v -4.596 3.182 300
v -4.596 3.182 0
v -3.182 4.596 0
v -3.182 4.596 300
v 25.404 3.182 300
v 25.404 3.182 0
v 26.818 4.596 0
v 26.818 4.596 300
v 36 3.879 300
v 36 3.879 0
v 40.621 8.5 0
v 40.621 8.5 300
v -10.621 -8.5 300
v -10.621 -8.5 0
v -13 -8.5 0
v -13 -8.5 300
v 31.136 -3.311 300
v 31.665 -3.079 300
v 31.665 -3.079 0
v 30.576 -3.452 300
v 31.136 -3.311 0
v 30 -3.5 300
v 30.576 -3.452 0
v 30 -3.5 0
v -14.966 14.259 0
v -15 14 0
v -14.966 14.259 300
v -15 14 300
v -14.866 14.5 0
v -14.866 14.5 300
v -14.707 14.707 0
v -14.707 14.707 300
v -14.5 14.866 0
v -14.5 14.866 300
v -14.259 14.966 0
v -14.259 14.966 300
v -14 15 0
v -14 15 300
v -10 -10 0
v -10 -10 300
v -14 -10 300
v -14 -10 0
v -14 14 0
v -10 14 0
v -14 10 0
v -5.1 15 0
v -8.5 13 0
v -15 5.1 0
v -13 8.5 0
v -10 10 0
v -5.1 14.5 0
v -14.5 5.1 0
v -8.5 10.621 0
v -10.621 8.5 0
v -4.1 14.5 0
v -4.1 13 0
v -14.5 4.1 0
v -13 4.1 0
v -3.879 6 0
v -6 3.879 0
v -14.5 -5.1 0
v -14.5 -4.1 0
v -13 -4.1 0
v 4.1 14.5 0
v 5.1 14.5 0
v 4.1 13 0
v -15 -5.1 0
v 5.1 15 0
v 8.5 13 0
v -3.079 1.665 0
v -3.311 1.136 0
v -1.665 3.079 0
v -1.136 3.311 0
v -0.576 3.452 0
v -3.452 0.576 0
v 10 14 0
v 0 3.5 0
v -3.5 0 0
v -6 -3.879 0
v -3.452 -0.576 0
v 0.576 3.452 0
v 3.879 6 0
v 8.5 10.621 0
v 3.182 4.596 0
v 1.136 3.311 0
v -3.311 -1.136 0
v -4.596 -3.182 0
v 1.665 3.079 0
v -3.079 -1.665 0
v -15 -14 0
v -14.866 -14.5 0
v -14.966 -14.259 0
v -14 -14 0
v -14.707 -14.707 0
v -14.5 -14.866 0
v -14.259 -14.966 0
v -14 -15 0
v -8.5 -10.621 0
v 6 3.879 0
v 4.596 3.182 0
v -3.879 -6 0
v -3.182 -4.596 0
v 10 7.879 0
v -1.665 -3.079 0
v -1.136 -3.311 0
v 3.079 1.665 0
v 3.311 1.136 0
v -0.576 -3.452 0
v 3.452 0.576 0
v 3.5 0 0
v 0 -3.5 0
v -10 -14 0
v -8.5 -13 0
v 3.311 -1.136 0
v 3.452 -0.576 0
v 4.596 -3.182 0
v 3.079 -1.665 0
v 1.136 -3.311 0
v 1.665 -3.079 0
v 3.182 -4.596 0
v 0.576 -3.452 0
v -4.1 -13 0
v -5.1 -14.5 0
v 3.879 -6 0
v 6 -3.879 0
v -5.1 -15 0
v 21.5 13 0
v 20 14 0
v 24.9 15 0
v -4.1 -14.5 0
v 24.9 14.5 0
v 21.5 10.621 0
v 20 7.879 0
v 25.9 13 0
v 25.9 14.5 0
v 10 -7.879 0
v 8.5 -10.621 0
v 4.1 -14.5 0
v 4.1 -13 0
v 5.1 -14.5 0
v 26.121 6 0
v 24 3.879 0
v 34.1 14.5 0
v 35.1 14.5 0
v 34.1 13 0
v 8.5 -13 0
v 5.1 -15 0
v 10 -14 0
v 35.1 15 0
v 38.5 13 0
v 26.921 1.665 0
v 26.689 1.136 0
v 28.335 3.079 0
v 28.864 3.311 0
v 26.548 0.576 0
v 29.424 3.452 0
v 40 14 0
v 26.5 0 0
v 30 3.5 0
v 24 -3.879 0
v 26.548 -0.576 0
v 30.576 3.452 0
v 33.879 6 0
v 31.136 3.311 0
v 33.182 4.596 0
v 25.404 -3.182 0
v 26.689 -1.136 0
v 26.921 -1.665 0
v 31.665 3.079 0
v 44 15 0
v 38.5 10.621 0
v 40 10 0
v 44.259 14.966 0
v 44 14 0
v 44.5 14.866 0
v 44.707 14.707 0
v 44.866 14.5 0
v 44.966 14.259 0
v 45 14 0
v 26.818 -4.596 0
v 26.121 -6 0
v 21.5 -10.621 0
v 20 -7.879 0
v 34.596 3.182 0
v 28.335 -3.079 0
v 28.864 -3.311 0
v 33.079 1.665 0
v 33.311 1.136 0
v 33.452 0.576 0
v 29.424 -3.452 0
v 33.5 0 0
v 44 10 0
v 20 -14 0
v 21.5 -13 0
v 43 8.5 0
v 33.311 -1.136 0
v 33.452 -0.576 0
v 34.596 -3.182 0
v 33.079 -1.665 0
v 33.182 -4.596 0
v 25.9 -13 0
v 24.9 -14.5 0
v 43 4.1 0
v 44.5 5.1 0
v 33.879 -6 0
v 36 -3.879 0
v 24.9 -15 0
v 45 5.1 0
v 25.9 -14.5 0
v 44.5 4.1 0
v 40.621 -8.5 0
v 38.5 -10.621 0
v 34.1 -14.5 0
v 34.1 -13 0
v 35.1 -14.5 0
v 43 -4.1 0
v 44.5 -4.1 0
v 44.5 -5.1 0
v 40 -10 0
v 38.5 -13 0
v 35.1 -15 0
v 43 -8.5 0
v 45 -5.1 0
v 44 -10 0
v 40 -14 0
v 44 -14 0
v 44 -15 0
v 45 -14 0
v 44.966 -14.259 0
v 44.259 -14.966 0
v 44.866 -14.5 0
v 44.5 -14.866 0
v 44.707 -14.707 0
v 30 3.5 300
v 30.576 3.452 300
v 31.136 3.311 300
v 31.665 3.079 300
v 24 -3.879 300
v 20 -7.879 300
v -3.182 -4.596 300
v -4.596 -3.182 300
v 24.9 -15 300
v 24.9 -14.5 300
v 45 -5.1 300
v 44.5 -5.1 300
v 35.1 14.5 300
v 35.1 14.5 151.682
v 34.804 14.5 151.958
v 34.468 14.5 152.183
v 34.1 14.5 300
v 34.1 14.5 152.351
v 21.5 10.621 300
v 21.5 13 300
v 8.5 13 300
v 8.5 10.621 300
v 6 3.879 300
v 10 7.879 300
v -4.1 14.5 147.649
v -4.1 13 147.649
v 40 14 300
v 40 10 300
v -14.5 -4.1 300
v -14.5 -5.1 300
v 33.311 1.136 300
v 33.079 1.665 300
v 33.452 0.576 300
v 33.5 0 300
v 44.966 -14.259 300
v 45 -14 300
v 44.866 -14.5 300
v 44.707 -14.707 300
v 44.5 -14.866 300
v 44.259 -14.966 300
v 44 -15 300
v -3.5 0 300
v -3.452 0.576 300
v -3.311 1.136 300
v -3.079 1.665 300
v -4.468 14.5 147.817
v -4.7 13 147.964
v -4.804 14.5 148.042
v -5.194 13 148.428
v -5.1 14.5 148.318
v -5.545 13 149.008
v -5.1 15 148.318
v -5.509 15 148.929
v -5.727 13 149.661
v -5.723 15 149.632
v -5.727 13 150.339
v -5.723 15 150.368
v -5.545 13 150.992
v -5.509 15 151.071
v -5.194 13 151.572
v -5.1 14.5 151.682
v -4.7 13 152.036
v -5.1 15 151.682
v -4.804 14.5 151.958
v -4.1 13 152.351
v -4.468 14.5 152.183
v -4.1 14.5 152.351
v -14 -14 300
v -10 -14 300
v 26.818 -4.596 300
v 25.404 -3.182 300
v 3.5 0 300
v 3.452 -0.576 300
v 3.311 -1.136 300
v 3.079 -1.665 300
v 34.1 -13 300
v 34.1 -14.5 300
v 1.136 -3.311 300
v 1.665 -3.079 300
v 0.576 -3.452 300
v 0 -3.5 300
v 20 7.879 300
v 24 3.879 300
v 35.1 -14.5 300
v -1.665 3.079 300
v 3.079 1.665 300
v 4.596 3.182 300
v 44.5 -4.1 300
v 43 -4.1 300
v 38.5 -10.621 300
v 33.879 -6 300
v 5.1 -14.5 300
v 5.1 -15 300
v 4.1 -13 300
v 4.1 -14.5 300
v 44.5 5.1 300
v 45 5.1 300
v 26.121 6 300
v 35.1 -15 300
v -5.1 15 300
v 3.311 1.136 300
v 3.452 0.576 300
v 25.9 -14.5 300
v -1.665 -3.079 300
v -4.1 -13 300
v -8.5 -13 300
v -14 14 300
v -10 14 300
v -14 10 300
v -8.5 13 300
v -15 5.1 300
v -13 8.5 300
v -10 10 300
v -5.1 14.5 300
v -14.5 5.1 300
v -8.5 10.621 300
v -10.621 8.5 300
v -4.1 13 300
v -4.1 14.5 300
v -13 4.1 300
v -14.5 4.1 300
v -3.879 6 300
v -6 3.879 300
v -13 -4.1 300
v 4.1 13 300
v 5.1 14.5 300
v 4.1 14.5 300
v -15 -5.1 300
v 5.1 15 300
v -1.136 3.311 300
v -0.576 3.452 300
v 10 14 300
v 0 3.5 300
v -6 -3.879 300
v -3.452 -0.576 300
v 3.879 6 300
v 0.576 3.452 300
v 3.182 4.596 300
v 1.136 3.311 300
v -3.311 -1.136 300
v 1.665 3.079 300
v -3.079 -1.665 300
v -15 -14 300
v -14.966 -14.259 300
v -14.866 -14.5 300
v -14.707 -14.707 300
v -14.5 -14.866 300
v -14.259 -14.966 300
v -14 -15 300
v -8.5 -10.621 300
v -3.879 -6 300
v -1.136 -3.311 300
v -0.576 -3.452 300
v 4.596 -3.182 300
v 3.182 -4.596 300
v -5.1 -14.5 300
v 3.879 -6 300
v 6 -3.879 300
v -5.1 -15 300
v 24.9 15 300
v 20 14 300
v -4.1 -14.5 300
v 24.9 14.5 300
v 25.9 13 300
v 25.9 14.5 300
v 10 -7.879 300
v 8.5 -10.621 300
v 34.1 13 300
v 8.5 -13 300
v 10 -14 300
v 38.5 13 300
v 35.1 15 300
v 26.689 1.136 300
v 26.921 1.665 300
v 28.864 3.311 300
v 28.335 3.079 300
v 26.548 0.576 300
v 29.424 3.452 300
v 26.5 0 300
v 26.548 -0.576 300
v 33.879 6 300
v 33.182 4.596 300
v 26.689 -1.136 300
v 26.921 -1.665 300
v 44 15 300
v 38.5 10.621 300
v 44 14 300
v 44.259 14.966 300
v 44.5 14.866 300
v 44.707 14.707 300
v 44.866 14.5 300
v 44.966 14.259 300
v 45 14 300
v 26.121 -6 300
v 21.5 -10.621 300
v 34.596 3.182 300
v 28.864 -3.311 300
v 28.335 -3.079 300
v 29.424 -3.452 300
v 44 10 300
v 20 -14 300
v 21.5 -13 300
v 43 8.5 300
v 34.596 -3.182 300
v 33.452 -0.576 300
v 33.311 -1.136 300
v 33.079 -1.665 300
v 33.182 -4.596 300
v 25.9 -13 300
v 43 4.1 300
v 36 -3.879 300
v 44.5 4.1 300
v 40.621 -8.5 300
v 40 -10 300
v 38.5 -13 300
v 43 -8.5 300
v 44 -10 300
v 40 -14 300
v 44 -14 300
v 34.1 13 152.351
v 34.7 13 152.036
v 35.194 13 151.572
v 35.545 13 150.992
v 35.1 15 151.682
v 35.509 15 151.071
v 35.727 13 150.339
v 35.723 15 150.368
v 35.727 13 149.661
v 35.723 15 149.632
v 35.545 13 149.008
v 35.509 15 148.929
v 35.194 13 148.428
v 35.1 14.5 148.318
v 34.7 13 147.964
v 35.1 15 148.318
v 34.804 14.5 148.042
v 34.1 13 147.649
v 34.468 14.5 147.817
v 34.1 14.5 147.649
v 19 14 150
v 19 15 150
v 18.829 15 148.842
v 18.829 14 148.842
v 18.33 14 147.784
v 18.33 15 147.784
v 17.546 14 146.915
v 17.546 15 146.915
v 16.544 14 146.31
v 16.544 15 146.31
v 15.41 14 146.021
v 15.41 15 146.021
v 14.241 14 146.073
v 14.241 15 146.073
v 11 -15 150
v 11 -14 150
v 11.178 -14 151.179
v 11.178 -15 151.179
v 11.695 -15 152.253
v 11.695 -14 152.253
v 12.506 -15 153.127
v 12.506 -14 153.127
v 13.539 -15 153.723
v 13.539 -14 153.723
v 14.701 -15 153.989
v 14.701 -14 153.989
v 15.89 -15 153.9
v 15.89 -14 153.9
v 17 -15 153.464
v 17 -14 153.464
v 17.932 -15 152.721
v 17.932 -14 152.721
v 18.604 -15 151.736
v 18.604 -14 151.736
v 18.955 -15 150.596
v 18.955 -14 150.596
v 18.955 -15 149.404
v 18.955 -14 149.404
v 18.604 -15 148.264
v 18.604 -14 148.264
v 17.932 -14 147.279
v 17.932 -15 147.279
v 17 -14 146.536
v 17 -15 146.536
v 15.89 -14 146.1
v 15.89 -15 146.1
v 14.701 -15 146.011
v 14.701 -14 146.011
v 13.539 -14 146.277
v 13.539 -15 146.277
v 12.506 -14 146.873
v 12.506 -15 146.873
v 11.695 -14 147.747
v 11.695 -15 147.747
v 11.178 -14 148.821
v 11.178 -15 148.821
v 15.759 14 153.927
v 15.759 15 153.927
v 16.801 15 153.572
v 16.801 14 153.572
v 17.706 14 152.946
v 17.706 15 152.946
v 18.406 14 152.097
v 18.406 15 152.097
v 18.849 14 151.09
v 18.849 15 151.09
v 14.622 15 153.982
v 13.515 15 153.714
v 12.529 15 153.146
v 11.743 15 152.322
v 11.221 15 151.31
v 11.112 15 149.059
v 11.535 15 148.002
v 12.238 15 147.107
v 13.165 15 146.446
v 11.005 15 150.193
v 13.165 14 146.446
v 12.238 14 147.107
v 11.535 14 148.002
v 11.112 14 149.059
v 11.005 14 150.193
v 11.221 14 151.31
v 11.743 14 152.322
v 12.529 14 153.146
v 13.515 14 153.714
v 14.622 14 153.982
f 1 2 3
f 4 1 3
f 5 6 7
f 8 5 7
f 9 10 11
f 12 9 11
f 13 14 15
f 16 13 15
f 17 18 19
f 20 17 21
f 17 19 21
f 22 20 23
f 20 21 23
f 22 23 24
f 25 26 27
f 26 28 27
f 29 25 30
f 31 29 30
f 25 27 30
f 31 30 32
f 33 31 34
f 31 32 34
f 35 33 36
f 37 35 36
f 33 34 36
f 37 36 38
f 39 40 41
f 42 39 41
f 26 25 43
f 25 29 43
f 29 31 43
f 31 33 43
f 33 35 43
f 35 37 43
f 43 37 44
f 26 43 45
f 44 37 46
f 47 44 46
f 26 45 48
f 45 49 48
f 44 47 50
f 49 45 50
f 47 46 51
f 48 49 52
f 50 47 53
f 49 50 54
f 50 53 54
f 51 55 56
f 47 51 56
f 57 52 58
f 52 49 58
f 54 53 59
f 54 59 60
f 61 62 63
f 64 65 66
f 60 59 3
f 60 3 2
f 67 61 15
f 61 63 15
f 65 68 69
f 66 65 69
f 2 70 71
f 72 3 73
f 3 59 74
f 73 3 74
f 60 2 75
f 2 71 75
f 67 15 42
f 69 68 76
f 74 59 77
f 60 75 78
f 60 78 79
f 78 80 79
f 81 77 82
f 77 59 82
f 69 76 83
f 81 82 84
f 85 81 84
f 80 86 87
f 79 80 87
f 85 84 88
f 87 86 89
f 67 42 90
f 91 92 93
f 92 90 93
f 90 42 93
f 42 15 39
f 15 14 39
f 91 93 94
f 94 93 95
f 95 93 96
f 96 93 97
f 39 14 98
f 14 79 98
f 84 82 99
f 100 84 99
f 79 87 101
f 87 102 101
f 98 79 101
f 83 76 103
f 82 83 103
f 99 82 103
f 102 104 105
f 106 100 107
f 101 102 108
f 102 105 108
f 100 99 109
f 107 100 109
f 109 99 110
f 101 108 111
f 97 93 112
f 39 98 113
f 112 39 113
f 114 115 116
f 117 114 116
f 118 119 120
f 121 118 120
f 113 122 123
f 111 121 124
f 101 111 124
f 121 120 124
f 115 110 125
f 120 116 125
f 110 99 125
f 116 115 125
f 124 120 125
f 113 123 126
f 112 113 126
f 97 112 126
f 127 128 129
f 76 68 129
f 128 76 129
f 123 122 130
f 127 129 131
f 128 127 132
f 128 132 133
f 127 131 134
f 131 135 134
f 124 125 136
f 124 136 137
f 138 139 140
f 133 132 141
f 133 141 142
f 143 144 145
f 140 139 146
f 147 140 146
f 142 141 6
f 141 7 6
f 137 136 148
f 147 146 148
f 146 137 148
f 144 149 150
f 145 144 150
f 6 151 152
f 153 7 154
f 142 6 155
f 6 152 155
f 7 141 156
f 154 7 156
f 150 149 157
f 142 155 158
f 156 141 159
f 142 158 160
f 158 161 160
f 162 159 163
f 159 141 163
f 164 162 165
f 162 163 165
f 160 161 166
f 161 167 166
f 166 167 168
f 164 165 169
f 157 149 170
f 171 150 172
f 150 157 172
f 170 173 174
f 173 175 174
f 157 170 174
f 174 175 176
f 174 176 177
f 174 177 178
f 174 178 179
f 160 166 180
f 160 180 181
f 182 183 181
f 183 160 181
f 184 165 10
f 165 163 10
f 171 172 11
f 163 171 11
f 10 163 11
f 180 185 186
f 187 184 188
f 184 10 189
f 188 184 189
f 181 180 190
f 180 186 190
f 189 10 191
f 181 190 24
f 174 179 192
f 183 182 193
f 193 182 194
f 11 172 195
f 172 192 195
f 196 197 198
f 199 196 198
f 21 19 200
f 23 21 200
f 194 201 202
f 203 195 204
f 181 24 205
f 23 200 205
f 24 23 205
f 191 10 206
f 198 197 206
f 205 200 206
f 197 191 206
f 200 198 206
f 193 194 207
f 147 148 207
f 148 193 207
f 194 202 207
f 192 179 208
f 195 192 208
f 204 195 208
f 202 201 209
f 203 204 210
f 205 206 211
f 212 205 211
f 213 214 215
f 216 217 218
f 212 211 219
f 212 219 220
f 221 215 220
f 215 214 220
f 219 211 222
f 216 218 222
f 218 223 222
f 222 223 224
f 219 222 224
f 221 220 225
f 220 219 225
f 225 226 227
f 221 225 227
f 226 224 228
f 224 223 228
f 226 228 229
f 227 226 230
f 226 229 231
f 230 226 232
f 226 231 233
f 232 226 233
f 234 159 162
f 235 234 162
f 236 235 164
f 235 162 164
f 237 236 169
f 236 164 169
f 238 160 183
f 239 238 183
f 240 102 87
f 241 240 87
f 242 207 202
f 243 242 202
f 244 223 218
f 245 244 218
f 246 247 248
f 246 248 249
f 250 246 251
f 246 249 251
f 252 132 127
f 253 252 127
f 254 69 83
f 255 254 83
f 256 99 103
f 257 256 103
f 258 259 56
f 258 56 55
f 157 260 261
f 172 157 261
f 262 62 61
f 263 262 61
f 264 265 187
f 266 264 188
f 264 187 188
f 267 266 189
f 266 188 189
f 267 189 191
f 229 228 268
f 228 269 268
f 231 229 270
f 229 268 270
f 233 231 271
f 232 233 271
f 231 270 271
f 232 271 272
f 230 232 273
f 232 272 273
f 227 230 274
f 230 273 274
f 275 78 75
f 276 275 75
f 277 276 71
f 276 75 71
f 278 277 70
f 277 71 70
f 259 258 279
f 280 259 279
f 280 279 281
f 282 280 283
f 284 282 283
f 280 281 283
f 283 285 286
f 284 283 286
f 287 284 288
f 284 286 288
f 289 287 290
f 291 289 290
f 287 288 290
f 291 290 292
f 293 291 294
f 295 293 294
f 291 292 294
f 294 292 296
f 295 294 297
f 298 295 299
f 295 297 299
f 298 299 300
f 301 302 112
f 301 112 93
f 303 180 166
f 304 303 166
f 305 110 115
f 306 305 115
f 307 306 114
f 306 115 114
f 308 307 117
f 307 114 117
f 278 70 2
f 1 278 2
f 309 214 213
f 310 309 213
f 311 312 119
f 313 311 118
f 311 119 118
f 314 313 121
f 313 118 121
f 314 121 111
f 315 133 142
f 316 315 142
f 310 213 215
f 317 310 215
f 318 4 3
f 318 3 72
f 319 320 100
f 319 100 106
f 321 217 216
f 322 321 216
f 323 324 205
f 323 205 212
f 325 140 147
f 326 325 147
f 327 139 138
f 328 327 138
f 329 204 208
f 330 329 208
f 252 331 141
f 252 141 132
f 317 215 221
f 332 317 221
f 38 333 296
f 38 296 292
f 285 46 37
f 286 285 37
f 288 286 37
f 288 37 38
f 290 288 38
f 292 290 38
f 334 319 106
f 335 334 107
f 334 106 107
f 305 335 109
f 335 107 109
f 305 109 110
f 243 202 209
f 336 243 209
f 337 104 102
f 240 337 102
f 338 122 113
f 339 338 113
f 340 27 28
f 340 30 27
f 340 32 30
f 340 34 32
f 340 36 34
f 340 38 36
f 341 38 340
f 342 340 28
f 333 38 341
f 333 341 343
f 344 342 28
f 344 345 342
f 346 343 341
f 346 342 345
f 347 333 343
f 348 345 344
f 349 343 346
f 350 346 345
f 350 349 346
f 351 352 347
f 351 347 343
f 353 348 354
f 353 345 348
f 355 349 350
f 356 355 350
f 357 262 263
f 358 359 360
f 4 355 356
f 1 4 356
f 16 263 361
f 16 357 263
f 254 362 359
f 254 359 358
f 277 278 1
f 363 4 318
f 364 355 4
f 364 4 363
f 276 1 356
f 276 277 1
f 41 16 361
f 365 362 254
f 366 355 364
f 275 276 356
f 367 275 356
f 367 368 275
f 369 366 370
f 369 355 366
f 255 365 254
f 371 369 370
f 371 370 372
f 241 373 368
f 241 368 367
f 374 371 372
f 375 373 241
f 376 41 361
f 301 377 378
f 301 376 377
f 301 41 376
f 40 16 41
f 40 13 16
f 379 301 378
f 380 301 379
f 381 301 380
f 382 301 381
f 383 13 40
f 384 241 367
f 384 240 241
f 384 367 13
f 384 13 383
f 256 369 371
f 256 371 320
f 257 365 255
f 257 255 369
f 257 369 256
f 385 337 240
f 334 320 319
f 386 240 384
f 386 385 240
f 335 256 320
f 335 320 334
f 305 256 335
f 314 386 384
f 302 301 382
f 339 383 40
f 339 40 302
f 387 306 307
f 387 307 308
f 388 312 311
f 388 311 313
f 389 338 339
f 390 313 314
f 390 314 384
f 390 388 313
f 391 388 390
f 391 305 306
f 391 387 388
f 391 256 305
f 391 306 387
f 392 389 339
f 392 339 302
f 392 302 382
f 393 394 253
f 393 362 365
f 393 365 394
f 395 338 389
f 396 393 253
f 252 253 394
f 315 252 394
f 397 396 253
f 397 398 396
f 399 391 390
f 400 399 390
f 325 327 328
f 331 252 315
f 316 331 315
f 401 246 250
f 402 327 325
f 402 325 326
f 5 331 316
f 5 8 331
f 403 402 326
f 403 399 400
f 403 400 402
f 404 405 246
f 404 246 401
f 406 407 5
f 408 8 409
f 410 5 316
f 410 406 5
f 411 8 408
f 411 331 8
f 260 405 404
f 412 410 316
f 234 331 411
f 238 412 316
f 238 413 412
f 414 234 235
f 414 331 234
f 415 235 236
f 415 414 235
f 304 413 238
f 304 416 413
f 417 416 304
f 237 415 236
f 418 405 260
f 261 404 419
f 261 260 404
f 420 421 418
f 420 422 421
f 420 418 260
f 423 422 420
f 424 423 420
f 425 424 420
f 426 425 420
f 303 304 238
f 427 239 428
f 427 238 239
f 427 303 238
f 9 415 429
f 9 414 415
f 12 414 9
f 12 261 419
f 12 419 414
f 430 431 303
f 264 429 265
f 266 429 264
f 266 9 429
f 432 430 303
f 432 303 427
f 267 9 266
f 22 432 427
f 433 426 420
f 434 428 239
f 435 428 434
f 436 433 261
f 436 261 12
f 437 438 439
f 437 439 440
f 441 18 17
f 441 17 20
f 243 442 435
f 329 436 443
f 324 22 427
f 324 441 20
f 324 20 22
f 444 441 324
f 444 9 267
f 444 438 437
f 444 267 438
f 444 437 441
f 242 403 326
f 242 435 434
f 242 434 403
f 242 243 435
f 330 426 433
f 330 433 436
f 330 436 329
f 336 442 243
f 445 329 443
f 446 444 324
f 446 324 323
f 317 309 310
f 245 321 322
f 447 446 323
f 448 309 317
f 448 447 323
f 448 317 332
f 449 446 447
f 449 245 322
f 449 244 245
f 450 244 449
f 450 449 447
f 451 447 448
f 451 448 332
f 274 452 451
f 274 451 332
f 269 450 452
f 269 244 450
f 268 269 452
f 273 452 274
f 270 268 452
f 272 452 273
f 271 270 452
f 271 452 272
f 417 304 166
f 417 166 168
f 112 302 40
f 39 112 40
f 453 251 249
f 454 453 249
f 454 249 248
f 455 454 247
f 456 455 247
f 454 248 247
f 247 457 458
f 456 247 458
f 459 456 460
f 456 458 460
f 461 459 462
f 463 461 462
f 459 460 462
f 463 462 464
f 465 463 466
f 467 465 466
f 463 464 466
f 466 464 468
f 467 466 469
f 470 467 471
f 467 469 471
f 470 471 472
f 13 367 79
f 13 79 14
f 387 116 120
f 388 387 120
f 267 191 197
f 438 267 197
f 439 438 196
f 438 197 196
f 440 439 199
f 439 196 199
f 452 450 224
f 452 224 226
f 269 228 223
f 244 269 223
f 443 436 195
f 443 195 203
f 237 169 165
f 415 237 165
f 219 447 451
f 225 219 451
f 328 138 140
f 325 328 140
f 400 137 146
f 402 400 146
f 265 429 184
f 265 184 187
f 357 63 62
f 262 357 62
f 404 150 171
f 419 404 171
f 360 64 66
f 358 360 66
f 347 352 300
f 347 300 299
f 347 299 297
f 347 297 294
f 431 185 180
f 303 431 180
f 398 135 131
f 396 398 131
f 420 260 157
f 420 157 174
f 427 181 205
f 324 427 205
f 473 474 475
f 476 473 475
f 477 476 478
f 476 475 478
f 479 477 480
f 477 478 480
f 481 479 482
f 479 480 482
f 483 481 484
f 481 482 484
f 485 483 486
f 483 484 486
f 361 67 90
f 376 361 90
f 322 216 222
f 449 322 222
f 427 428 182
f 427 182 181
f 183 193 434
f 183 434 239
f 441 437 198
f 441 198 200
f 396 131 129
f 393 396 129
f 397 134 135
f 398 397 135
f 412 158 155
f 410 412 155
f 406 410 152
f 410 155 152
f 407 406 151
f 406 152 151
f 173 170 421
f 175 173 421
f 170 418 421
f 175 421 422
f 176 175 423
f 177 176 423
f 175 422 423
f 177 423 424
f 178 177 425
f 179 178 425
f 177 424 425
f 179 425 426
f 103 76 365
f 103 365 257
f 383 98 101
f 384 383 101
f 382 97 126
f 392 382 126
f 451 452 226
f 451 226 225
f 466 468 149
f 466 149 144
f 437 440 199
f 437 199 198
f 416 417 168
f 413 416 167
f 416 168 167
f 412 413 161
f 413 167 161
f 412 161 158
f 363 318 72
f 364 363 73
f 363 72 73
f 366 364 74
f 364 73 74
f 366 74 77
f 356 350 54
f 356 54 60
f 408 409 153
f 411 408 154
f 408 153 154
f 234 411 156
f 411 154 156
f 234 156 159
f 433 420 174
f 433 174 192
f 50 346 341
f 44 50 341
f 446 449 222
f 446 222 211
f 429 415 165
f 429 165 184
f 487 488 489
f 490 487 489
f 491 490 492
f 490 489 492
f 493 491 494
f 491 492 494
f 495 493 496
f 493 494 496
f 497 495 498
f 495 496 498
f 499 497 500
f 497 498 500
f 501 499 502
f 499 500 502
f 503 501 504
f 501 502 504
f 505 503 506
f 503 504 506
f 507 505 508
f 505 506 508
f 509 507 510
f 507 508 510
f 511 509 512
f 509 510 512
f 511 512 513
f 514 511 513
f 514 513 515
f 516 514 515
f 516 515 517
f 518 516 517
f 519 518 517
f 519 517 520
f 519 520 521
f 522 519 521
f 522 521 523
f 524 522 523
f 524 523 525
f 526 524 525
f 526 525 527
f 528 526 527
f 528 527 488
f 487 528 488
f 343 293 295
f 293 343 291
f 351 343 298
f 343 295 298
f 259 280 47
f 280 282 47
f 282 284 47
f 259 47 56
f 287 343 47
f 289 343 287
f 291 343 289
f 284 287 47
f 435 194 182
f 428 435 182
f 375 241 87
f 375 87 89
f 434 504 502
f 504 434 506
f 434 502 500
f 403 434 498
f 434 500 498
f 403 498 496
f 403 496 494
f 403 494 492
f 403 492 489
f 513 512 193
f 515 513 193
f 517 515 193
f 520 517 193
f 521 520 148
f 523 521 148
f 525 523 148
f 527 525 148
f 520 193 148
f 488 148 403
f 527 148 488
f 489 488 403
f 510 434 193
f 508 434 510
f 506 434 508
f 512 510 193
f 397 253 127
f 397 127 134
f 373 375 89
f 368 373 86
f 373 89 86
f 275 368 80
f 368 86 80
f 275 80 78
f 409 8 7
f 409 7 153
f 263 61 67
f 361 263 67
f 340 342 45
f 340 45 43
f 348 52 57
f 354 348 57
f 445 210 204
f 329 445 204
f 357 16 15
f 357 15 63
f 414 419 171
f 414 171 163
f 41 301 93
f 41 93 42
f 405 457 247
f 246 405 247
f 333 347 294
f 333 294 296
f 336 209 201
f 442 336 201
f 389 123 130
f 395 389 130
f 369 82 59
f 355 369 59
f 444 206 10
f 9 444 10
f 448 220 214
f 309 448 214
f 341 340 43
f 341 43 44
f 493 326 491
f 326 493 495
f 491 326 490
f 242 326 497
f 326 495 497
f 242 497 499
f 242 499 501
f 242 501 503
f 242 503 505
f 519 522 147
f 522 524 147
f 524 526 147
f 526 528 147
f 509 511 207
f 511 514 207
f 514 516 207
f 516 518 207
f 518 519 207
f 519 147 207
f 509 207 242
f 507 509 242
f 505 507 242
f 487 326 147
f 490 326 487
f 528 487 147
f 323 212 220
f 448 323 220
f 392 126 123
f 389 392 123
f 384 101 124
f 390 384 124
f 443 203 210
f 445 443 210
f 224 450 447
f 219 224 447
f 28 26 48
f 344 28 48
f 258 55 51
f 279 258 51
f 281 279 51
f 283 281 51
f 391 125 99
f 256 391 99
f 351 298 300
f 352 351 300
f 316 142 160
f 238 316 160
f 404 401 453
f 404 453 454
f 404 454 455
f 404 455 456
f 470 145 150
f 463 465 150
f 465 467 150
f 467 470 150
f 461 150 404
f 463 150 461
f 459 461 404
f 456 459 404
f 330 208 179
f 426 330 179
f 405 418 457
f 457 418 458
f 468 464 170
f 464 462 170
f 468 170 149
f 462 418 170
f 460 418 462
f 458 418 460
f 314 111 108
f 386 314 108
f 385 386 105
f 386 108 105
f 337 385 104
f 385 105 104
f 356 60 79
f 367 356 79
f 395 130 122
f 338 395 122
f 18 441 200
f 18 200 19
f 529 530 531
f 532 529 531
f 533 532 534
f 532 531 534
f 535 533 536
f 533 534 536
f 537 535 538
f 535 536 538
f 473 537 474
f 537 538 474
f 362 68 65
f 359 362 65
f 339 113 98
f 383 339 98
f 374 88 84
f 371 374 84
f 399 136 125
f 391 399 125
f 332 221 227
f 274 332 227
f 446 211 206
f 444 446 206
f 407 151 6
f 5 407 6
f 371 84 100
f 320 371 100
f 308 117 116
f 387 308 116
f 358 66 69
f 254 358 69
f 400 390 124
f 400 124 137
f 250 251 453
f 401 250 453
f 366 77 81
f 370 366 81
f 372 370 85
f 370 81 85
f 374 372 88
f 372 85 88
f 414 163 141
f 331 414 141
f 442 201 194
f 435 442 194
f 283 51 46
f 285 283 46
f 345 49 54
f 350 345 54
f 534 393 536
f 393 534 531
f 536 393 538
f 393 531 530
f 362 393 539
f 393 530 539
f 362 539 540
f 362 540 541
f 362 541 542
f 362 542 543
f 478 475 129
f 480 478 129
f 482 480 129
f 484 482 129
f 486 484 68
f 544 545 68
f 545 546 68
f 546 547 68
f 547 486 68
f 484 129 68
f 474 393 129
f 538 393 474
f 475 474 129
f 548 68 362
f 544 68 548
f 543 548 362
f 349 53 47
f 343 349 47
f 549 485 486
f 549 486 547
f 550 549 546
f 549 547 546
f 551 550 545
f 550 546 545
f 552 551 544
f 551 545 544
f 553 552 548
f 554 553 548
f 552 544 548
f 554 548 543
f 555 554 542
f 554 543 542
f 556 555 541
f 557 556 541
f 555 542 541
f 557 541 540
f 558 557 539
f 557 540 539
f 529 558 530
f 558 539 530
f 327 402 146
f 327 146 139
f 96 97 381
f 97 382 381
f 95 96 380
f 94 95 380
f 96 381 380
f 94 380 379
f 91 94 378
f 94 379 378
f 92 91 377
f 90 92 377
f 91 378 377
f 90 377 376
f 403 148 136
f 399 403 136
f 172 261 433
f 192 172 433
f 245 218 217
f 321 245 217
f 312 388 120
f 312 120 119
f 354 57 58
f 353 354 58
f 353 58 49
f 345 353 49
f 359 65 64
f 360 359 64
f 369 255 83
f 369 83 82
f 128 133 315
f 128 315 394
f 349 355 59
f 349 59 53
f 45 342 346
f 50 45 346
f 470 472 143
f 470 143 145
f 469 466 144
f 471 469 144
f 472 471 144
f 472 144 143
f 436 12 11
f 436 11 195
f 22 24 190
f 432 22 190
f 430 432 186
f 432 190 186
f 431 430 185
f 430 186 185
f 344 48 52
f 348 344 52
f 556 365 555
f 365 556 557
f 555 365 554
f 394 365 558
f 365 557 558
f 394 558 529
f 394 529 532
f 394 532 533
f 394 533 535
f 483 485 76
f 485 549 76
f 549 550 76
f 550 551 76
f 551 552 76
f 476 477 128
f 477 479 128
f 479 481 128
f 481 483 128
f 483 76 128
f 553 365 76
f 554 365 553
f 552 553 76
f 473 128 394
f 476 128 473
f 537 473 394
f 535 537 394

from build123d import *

# Parameters (mm, degrees)
ESBO_O1_W                      = 4
ESBO_O1_H                      = 4
RESSALTO_EXTRUS_O1_DEPTH       = 300
PADR_OCIRCULAR1_COUNT          = 4
PADR_O_LINEAR1_COUNT           = 2
PADR_O_LINEAR1_PITCH           = 30
PADR_O_LINEAR1_COPY_1_SKETCH_W = 4
PADR_O_LINEAR1_COPY_1_SKETCH_H = 4
PADR_O_LINEAR1_COPY_1_DEPTH    = 300
PADR_O_LINEAR1_COPY_2_SKETCH_W = 4
PADR_O_LINEAR1_COPY_2_SKETCH_H = 4
PADR_O_LINEAR1_COPY_2_DEPTH    = 300
PADR_O_LINEAR1_COPY_3_SKETCH_W = 4
PADR_O_LINEAR1_COPY_3_SKETCH_H = 4
PADR_O_LINEAR1_COPY_3_DEPTH    = 300
ESBO_O4_W                      = 10
ESBO_O4_H                      = 28
CORTE_EXTRUS_O1_DEPTH          = 304.72685097
FILETE1_R                      = 1
SKETCH1_R                      = 2.5
CUT_EXTRUDE1_DEPTH             = 3
SKETCH2_R                      = 4
CUT_EXTRUDE2_DEPTH             = 305.836021494


with BuildPart() as part:
    # Esboço1 → Ressalto-extrusão1 (new body)
    with BuildSketch(Plane.XY):
        with BuildLine():
            ThreePointArc((-1.664601464, 3.078815026), (-0.858529967, 3.393070335), (0, 3.5))
            Line((0, 3.5), (0, 6))
            Line((0, 6), (-3.878679656, 6))
            Line((-3.878679656, 6), (-8.5, 10.621320344))
            Line((-8.5, 10.621320344), (-8.5, 13))
            Line((-8.5, 13), (-4.1, 13))
            Line((-4.1, 13), (-4.1, 14.5))
            Line((-4.1, 14.5), (-5.1, 14.5))
            Line((-5.1, 14.5), (-5.1, 15))
            Line((-5.1, 15), (-15, 15))
            Line((-15, 15), (-15, 5.1))
            Line((-15, 5.1), (-14.5, 5.1))
            Line((-14.5, 5.1), (-14.5, 4.1))
            Line((-14.5, 4.1), (-13, 4.1))
            Line((-13, 4.1), (-13, 8.5))
            Line((-13, 8.5), (-10.621320344, 8.5))
            Line((-10.621320344, 8.5), (-6, 3.878679656))
            Line((-6, 3.878679656), (-6, 0))
            Line((-6, 0), (-3.5, 0))
            ThreePointArc((-3.5, 0), (-3.393070335, 0.858529967), (-3.078815026, 1.664601464))
            Line((-3.078815026, 1.664601464), (-4.596194078, 3.181980515))
            Line((-4.596194078, 3.181980515), (-3.181980515, 4.596194078))
            Line((-3.181980515, 4.596194078), (-1.664601464, 3.078815026))
        make_face()
        with Locations((-12, 12)):
            Rectangle(ESBO_O1_W, ESBO_O1_H, mode=Mode.SUBTRACT)
    ressalto_extrus_o1 = extrude(amount=RESSALTO_EXTRUS_O1_DEPTH)

    # PadrãoCircular1: Ressalto-extrusão1 ×4 about axis
    padr_ocircular1_axis = Axis((0, 0, 0), (0, 0, 1))
    for i in range(1, PADR_OCIRCULAR1_COUNT):
        add(ressalto_extrus_o1.rotate(padr_ocircular1_axis, i * 360 / PADR_OCIRCULAR1_COUNT))

    # Padrão linear1: Ressalto-extrusão1 ×2
    with Locations(*[(i * PADR_O_LINEAR1_PITCH, 0, 0) for i in range(1, PADR_O_LINEAR1_COUNT)]):
        add(ressalto_extrus_o1)

    # Padrão linear1 copy 1 sketch → Padrão linear1 copy 1 (add)
    with BuildSketch(Plane(origin=(30, 0, 0), x_dir=(0, 1, 0), z_dir=(0, 0, 1))):
        with BuildLine():
            ThreePointArc((-1.664601464, 3.078815026), (-0.858529967, 3.393070335), (0, 3.5))
            Line((0, 3.5), (0, 6))
            Line((0, 6), (-3.878679656, 6))
            Line((-3.878679656, 6), (-8.5, 10.621320344))
            Line((-8.5, 10.621320344), (-8.5, 13))
            Line((-8.5, 13), (-4.1, 13))
            Line((-4.1, 13), (-4.1, 14.5))
            Line((-4.1, 14.5), (-5.1, 14.5))
            Line((-5.1, 14.5), (-5.1, 15))
            Line((-5.1, 15), (-15, 15))
            Line((-15, 15), (-15, 5.1))
            Line((-15, 5.1), (-14.5, 5.1))
            Line((-14.5, 5.1), (-14.5, 4.1))
            Line((-14.5, 4.1), (-13, 4.1))
            Line((-13, 4.1), (-13, 8.5))
            Line((-13, 8.5), (-10.621320344, 8.5))
            Line((-10.621320344, 8.5), (-6, 3.878679656))
            Line((-6, 3.878679656), (-6, 0))
            Line((-6, 0), (-3.5, 0))
            ThreePointArc((-3.5, 0), (-3.393070335, 0.858529967), (-3.078815026, 1.664601464))
            Line((-3.078815026, 1.664601464), (-4.596194078, 3.181980515))
            Line((-4.596194078, 3.181980515), (-3.181980515, 4.596194078))
            Line((-3.181980515, 4.596194078), (-1.664601464, 3.078815026))
        make_face()
        with Locations((-12, 12)):
            Rectangle(PADR_O_LINEAR1_COPY_1_SKETCH_W, PADR_O_LINEAR1_COPY_1_SKETCH_H, mode=Mode.SUBTRACT)
    extrude(amount=PADR_O_LINEAR1_COPY_1_DEPTH)

    # Padrão linear1 copy 2 sketch → Padrão linear1 copy 2 (add)
    with BuildSketch(Plane(origin=(30, 0, 0), x_dir=(-1, 0, 0), z_dir=(0, 0, 1))):
        with BuildLine():
            ThreePointArc((-1.664601464, 3.078815026), (-0.858529967, 3.393070335), (0, 3.5))
            Line((0, 3.5), (0, 6))
            Line((0, 6), (-3.878679656, 6))
            Line((-3.878679656, 6), (-8.5, 10.621320344))
            Line((-8.5, 10.621320344), (-8.5, 13))
            Line((-8.5, 13), (-4.1, 13))
            Line((-4.1, 13), (-4.1, 14.5))
            Line((-4.1, 14.5), (-5.1, 14.5))
            Line((-5.1, 14.5), (-5.1, 15))
            Line((-5.1, 15), (-15, 15))
            Line((-15, 15), (-15, 5.1))
            Line((-15, 5.1), (-14.5, 5.1))
            Line((-14.5, 5.1), (-14.5, 4.1))
            Line((-14.5, 4.1), (-13, 4.1))
            Line((-13, 4.1), (-13, 8.5))
            Line((-13, 8.5), (-10.621320344, 8.5))
            Line((-10.621320344, 8.5), (-6, 3.878679656))
            Line((-6, 3.878679656), (-6, 0))
            Line((-6, 0), (-3.5, 0))
            ThreePointArc((-3.5, 0), (-3.393070335, 0.858529967), (-3.078815026, 1.664601464))
            Line((-3.078815026, 1.664601464), (-4.596194078, 3.181980515))
            Line((-4.596194078, 3.181980515), (-3.181980515, 4.596194078))
            Line((-3.181980515, 4.596194078), (-1.664601464, 3.078815026))
        make_face()
        with Locations((-12, 12)):
            Rectangle(PADR_O_LINEAR1_COPY_2_SKETCH_W, PADR_O_LINEAR1_COPY_2_SKETCH_H, mode=Mode.SUBTRACT)
    extrude(amount=PADR_O_LINEAR1_COPY_2_DEPTH)

    # Padrão linear1 copy 3 sketch → Padrão linear1 copy 3 (add)
    with BuildSketch(Plane(origin=(30, 0, 0), x_dir=(0, -1, 0), z_dir=(0, 0, 1))):
        with BuildLine():
            ThreePointArc((-1.664601464, 3.078815026), (-0.858529967, 3.393070335), (0, 3.5))
            Line((0, 3.5), (0, 6))
            Line((0, 6), (-3.878679656, 6))
            Line((-3.878679656, 6), (-8.5, 10.621320344))
            Line((-8.5, 10.621320344), (-8.5, 13))
            Line((-8.5, 13), (-4.1, 13))
            Line((-4.1, 13), (-4.1, 14.5))
            Line((-4.1, 14.5), (-5.1, 14.5))
            Line((-5.1, 14.5), (-5.1, 15))
            Line((-5.1, 15), (-15, 15))
            Line((-15, 15), (-15, 5.1))
            Line((-15, 5.1), (-14.5, 5.1))
            Line((-14.5, 5.1), (-14.5, 4.1))
            Line((-14.5, 4.1), (-13, 4.1))
            Line((-13, 4.1), (-13, 8.5))
            Line((-13, 8.5), (-10.621320344, 8.5))
            Line((-10.621320344, 8.5), (-6, 3.878679656))
            Line((-6, 3.878679656), (-6, 0))
            Line((-6, 0), (-3.5, 0))
            ThreePointArc((-3.5, 0), (-3.393070335, 0.858529967), (-3.078815026, 1.664601464))
            Line((-3.078815026, 1.664601464), (-4.596194078, 3.181980515))
            Line((-4.596194078, 3.181980515), (-3.181980515, 4.596194078))
            Line((-3.181980515, 4.596194078), (-1.664601464, 3.078815026))
        make_face()
        with Locations((-12, 12)):
            Rectangle(PADR_O_LINEAR1_COPY_3_SKETCH_W, PADR_O_LINEAR1_COPY_3_SKETCH_H, mode=Mode.SUBTRACT)
    extrude(amount=PADR_O_LINEAR1_COPY_3_DEPTH)

    # Esboço4 → Corte-extrusão1 (cut, through all)
    with BuildSketch(Plane(origin=(0, 0, 0), x_dir=(-1, 0, 0), z_dir=(0, 0, -1))):
        with Locations((-15, 0)):
            Rectangle(ESBO_O4_W, ESBO_O4_H)
    extrude(amount=-CORTE_EXTRUS_O1_DEPTH, mode=Mode.SUBTRACT)

    # Filete1
    filete1_edges = [part.edges().sort_by_distance(p)[0] for p in [
        (45, -15, 150),
        (45, 15, 150),
        (-15, 15, 150),
        (-15, -15, 150),
    ]]
    fillet(filete1_edges, radius=FILETE1_R)

    # Sketch1 → Cut-Extrude1 (cut)
    with BuildSketch(Plane(origin=(0, 15, 0), x_dir=(1, 0, 0), z_dir=(0, 1, 0))):
        with BuildLine():
            ThreePointArc((19, -150), (17.54586978, -146.914785735), (14.24072647, -146.072723118))
            Line((14.24072647, -146.072723118), (15.75927353, -153.927276882))
            ThreePointArc((15.75927353, -153.927276882), (18.085214265, -152.54586978), (19, -150))
        make_face()
        with BuildLine():
            Line((15.75927353, -153.927276882), (14.24072647, -146.072723118))
            ThreePointArc((14.24072647, -146.072723118), (11.072723118, -150.75927353), (15.75927353, -153.927276882))
        make_face()
        with Locations((33.25, -150)):
            Circle(SKETCH1_R)
        with Locations((-3.25, -150)):
            Circle(SKETCH1_R)
    extrude(amount=-CUT_EXTRUDE1_DEPTH, mode=Mode.SUBTRACT)

    # Sketch2 → Cut-Extrude2 (cut, through all)
    with BuildSketch(Plane(origin=(0, 15, 0), x_dir=(1, 0, 0), z_dir=(0, 1, 0))):
        with Locations(Location((15, -150, 0), (0, 0, 180))):
            Circle(SKETCH2_R)
    extrude(amount=-CUT_EXTRUDE2_DEPTH, mode=Mode.SUBTRACT)


solid = part.part
